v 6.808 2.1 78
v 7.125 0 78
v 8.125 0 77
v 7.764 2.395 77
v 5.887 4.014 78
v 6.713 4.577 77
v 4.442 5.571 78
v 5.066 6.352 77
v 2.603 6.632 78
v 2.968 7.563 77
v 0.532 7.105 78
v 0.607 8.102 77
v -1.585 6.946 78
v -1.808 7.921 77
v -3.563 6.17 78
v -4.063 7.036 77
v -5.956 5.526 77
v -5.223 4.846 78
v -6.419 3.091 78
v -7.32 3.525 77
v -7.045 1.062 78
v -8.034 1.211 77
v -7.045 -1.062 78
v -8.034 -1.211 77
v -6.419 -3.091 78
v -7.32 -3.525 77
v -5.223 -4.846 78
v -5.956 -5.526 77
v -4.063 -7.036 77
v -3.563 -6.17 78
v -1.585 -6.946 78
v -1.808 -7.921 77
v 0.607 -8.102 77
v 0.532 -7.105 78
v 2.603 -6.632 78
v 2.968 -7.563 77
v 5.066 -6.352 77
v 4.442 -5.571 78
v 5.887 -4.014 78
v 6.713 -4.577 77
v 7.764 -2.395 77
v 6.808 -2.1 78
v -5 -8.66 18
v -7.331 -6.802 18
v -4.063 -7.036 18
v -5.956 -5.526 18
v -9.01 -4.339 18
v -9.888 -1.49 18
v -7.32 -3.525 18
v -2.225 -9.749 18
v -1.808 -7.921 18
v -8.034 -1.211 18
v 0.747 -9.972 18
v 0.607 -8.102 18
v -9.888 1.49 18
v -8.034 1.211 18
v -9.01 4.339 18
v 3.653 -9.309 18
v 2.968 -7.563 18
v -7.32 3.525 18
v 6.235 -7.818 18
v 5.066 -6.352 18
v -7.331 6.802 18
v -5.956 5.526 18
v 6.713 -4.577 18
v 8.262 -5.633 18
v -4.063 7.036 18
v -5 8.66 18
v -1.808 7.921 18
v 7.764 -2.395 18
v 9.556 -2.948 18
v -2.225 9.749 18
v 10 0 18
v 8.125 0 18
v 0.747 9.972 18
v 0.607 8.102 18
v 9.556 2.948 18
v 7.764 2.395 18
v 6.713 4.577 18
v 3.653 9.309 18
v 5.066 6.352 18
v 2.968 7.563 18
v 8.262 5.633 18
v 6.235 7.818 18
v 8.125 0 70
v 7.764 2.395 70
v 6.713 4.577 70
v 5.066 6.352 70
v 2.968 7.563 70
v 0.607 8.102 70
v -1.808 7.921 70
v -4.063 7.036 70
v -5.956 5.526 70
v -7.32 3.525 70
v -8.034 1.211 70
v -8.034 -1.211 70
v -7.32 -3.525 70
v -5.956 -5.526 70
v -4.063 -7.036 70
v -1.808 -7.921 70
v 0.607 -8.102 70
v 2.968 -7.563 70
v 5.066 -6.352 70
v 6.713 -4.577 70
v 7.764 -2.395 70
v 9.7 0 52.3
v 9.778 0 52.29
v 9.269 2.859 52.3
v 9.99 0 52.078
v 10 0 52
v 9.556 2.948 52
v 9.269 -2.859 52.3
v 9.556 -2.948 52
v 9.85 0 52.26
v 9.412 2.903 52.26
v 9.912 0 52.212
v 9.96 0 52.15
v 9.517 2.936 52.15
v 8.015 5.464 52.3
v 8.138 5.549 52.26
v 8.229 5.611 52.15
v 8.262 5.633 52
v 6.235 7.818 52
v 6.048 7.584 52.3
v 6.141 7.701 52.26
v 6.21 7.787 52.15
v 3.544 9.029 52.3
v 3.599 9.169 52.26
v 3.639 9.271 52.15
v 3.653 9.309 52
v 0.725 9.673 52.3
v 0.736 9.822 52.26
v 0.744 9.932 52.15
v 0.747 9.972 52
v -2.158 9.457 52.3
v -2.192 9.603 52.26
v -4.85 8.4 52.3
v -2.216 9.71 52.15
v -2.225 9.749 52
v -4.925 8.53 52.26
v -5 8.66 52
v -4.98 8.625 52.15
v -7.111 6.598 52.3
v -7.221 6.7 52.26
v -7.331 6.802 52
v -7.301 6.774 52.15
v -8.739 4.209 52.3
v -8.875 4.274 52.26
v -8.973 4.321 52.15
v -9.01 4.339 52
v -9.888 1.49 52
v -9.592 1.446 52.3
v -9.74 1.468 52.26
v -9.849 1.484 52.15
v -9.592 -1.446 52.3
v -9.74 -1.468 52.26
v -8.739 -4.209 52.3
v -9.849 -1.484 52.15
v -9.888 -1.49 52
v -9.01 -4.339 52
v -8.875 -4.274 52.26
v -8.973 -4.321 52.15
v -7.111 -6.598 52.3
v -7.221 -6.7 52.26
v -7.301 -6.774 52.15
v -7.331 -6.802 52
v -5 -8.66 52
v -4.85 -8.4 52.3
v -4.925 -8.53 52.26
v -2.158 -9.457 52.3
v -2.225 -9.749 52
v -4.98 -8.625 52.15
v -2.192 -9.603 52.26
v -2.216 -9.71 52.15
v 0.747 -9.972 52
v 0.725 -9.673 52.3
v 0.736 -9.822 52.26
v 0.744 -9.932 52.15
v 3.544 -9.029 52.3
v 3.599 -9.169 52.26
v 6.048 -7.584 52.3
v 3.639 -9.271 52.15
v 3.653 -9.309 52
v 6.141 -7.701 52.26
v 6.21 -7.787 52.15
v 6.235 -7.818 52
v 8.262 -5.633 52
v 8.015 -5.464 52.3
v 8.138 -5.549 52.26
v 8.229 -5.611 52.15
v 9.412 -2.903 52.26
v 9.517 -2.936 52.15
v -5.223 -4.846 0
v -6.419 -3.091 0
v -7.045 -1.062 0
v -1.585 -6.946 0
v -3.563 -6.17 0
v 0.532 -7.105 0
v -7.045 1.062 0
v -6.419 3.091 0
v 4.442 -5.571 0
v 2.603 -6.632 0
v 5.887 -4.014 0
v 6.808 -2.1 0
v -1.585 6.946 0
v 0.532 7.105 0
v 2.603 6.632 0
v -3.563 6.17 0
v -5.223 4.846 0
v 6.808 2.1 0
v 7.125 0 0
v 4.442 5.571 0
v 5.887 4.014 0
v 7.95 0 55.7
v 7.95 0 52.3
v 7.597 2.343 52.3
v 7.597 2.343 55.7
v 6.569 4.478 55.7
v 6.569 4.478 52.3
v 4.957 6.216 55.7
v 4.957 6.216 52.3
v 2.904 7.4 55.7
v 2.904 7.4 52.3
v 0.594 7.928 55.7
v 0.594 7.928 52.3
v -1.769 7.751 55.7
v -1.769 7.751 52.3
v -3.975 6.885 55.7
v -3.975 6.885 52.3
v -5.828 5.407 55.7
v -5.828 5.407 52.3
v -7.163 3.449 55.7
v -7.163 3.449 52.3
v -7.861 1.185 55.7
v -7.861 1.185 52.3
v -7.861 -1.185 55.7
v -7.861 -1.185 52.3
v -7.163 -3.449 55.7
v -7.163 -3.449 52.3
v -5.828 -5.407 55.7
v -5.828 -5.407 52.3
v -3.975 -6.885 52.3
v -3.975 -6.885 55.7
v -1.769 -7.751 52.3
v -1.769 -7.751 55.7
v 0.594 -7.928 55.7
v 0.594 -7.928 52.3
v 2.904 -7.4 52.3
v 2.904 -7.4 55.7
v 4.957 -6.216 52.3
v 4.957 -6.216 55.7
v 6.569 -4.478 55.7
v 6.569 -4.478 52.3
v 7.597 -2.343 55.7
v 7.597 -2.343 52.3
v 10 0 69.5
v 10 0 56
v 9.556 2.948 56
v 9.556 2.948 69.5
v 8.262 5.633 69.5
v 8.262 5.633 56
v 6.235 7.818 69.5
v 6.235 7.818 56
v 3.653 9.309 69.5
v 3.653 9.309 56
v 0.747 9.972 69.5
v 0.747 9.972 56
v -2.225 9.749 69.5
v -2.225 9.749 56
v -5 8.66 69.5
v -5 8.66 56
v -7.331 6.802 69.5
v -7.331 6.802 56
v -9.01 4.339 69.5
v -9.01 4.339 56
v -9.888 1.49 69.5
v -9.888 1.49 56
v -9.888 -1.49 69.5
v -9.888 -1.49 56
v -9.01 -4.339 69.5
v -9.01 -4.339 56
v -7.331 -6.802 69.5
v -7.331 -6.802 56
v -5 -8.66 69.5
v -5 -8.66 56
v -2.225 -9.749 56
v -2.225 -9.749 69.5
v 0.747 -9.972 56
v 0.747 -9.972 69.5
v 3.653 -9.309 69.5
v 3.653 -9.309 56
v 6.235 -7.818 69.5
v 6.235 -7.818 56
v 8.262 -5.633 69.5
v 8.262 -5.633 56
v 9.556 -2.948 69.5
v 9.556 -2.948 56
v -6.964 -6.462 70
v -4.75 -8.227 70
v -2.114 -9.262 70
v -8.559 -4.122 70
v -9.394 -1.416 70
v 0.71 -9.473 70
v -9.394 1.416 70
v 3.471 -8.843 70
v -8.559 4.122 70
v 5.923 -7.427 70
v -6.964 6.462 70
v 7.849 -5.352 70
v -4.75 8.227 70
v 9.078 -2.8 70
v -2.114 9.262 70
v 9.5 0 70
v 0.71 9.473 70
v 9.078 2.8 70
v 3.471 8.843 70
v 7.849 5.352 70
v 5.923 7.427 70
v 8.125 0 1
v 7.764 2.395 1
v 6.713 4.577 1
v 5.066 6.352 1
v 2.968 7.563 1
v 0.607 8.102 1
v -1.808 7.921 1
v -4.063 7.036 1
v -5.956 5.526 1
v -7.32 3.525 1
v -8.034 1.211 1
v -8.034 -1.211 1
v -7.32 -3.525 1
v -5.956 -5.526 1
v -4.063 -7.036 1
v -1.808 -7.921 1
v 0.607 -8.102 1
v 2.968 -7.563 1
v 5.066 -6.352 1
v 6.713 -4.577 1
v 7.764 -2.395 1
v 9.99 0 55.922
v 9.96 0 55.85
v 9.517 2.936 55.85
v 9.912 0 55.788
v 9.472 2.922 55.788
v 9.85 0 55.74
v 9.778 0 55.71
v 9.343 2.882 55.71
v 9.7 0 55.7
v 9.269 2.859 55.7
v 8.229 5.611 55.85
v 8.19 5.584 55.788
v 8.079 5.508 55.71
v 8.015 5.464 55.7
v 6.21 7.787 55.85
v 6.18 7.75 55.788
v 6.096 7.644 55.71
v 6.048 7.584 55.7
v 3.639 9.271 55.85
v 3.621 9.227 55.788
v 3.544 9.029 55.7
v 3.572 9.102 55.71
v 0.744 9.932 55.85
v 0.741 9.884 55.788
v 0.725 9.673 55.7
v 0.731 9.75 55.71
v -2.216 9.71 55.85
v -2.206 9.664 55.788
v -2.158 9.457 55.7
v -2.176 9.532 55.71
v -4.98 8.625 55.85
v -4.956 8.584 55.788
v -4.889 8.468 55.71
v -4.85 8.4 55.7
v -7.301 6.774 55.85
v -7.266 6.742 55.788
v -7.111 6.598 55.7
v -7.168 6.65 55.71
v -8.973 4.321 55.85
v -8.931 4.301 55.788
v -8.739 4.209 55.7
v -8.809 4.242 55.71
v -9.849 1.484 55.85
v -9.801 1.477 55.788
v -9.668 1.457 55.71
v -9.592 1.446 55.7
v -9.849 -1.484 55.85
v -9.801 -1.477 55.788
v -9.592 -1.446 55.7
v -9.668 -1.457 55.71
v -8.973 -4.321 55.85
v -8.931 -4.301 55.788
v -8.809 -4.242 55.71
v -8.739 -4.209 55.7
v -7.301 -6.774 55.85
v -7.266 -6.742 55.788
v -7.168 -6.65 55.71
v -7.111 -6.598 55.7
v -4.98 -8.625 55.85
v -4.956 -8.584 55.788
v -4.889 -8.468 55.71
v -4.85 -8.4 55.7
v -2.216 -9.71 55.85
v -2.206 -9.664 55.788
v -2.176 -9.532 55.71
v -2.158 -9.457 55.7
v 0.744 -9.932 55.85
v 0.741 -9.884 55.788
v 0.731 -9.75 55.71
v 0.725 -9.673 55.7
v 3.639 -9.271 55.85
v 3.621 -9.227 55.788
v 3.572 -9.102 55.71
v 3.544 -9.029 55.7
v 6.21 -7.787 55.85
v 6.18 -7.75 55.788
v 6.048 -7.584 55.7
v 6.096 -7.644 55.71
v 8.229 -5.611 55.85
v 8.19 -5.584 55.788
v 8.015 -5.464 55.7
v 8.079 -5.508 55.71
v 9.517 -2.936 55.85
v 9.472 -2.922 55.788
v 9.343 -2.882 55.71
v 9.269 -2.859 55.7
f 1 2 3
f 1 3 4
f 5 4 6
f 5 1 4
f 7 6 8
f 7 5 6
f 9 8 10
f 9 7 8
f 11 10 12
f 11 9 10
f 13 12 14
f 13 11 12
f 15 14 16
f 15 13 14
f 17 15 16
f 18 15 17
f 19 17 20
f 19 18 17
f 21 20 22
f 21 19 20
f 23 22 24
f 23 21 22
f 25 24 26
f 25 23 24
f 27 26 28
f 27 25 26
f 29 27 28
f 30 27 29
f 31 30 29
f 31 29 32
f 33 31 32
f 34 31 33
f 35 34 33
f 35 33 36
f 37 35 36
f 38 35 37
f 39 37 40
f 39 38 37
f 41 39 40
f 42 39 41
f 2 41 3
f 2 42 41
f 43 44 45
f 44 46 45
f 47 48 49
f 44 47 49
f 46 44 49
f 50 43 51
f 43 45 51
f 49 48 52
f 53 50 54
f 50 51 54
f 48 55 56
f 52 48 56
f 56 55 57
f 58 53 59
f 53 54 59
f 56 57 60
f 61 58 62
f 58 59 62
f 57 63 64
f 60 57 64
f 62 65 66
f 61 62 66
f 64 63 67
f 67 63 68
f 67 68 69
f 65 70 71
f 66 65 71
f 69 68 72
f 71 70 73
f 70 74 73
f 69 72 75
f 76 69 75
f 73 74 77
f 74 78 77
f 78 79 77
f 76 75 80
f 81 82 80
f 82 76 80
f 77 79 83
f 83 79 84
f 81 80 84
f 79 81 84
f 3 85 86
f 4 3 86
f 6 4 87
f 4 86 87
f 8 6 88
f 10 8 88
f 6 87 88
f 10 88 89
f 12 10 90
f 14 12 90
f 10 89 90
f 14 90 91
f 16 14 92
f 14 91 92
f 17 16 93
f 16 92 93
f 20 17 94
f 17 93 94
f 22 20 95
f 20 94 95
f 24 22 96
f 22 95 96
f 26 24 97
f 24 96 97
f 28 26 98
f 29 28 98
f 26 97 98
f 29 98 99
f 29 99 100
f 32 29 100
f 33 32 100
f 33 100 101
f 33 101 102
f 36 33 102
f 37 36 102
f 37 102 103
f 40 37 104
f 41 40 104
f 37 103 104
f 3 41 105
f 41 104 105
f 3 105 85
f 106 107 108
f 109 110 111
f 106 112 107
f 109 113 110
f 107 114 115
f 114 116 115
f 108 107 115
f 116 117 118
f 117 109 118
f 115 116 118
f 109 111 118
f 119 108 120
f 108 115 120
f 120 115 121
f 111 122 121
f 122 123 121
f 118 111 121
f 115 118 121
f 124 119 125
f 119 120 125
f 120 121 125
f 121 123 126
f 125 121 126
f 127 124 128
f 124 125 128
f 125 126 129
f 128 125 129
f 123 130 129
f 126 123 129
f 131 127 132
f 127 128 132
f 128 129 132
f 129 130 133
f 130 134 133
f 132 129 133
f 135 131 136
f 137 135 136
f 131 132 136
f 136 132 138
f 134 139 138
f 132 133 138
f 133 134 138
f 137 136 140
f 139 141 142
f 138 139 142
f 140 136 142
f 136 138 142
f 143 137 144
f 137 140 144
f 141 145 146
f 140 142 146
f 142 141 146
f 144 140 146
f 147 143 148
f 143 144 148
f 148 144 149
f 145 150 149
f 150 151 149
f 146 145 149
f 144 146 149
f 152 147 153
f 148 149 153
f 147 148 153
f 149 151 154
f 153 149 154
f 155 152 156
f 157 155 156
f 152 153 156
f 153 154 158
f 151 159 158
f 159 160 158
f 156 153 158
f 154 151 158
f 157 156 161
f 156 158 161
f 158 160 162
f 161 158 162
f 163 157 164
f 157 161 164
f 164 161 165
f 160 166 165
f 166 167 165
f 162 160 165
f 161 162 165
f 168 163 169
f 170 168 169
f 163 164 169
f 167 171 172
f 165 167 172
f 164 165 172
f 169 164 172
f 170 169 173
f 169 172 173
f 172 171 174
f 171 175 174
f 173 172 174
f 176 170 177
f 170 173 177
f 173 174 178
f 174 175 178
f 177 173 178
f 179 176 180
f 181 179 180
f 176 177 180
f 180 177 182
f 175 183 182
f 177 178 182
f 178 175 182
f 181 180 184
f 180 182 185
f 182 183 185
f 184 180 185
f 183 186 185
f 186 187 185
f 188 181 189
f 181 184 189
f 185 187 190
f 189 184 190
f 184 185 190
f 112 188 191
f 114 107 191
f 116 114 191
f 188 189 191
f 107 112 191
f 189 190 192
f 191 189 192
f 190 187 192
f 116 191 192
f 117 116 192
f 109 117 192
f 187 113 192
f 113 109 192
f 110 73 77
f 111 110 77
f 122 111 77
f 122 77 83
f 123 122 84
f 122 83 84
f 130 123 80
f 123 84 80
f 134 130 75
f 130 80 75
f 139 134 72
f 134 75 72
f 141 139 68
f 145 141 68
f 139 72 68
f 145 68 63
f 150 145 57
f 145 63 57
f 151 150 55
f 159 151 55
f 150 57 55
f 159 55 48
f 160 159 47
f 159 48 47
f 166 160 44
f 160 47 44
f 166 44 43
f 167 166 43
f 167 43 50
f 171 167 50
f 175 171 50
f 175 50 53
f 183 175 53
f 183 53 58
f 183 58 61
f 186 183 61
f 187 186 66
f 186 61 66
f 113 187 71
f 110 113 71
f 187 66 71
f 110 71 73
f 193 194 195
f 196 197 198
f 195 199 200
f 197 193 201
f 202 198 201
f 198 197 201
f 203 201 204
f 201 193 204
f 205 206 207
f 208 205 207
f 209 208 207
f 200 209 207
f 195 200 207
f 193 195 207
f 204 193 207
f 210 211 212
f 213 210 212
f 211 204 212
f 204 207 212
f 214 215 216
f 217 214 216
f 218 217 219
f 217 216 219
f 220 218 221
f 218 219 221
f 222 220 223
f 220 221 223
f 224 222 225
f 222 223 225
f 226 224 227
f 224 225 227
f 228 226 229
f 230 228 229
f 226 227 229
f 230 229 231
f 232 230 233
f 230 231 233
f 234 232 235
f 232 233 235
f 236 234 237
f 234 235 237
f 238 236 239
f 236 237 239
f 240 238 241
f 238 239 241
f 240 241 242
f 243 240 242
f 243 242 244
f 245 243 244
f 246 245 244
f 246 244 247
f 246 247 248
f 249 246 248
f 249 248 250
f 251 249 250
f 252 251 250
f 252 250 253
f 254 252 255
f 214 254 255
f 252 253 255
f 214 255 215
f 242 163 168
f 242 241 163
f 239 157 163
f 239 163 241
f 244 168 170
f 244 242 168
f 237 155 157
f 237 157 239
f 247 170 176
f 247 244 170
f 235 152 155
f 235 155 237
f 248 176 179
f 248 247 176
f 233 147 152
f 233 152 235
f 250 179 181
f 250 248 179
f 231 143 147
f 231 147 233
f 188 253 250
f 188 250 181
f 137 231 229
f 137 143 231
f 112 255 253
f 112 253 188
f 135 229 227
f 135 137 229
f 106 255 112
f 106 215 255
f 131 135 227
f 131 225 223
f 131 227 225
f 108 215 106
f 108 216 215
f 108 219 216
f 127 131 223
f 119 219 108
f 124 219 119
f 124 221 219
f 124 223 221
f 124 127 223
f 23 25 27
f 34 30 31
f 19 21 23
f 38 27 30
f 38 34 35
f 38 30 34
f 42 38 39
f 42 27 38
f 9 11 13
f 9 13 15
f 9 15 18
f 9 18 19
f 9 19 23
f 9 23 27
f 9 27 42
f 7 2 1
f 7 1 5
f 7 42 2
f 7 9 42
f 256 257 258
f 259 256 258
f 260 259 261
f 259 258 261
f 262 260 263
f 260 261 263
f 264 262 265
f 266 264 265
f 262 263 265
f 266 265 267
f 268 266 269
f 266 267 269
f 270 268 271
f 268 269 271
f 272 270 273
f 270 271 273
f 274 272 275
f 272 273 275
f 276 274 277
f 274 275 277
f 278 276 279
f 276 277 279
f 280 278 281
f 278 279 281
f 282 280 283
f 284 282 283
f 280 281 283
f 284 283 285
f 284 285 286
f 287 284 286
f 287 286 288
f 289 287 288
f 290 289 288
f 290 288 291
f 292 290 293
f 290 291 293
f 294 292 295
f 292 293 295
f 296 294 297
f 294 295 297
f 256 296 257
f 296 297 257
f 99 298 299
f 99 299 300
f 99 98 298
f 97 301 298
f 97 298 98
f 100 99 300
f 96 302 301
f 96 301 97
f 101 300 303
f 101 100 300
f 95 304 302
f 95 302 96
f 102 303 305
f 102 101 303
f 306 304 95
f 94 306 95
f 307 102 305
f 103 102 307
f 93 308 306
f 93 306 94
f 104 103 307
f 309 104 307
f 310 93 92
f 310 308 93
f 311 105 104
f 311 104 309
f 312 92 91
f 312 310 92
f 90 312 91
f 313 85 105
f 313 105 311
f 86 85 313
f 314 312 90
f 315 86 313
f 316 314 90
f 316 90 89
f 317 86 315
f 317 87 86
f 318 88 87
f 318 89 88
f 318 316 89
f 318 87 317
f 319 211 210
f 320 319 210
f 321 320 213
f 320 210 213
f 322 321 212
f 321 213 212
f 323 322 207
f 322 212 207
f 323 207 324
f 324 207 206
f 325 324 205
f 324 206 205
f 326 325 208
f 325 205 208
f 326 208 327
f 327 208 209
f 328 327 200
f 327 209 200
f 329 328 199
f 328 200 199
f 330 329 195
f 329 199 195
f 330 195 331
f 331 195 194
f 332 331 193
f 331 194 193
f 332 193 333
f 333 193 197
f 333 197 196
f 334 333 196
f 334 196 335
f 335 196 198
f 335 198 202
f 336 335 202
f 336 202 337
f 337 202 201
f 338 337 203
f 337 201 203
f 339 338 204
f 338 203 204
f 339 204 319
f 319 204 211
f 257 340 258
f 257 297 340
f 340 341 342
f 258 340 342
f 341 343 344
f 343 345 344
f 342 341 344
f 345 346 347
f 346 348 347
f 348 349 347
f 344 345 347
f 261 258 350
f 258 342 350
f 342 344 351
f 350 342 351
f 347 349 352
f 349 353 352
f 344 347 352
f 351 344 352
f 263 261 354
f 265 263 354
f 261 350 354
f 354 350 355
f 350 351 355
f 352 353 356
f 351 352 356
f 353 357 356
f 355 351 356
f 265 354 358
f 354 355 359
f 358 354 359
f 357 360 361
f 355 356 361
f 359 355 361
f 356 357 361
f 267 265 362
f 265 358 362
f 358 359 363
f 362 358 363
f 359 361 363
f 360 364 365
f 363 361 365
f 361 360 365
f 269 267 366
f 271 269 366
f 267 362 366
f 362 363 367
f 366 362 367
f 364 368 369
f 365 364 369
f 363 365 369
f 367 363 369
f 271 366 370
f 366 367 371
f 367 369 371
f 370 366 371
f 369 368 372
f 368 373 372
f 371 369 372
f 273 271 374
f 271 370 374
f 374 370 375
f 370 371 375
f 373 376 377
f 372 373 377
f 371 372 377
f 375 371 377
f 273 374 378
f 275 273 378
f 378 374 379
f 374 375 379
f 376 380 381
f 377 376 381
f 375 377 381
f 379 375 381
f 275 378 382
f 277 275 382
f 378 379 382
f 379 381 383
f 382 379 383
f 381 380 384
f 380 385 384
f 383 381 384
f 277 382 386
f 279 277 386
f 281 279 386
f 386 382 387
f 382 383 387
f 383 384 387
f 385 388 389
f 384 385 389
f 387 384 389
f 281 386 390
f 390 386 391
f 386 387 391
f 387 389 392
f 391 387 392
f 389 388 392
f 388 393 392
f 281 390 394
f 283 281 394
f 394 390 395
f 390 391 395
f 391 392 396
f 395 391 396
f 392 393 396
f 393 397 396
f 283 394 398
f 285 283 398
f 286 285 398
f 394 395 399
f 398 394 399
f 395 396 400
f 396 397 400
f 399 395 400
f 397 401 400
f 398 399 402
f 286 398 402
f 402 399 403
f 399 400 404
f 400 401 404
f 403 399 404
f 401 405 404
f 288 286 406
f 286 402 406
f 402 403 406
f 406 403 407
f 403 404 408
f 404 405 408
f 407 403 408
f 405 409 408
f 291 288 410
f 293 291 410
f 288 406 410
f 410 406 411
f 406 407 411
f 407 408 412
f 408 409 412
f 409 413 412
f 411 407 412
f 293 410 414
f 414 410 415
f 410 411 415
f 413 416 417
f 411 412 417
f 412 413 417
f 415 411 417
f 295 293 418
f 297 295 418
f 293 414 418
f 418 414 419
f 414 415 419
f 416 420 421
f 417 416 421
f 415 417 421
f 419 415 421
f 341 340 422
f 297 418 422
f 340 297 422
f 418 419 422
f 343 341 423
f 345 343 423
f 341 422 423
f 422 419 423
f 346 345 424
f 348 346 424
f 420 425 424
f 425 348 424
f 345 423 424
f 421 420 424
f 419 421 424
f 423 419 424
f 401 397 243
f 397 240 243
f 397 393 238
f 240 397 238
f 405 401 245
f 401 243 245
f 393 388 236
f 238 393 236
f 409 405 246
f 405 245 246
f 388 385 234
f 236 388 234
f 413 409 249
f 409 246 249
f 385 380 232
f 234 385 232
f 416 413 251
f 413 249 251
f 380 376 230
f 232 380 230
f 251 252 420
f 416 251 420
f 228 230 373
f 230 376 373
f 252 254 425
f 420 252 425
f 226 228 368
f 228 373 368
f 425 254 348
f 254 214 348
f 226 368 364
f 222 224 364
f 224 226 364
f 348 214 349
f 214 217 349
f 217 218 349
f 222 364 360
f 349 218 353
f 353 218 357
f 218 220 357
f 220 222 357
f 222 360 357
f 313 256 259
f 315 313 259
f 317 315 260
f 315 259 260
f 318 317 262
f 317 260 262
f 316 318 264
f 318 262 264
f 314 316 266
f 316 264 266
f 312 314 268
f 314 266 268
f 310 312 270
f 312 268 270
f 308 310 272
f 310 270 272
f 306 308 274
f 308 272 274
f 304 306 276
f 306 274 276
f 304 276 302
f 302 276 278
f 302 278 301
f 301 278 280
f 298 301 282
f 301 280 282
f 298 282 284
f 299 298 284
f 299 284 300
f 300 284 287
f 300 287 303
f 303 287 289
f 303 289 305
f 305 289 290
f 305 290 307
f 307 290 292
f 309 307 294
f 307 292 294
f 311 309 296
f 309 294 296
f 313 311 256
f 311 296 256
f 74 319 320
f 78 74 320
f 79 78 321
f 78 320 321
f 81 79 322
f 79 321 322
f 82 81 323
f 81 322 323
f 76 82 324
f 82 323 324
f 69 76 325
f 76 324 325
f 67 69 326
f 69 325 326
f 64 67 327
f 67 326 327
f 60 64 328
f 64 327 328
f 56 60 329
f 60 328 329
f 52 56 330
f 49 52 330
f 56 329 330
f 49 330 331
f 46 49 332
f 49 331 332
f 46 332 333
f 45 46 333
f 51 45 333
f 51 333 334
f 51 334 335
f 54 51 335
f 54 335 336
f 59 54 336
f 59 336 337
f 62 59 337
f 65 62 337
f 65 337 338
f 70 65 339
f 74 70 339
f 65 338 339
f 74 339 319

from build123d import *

# Parameters (mm, degrees)
F0_R      = 8.125
F1_DEPTH  = 18
F2_SIZE   = 1
F3_R      = 10
F4_DEPTH  = 34.3
F5_R      = 7.95
F6_DEPTH  = 3.4
F8_R      = 10
F9_DEPTH  = 14.3
F10_R     = 8.125
F11_DEPTH = 8
F12_SIZE  = 1
F13_SIZE  = 0.5
F14_R     = 0.3


with BuildPart() as f1:
    # F0 (on Top) → F1 (new body)
    with BuildSketch(Plane.XY):
        Circle(F0_R)
    extrude(amount=F1_DEPTH)

    # F2
    f2_edges = [f1.edges().sort_by_distance(p)[0] for p in [
        (-8.125, 0, 0),
    ]]
    chamfer(f2_edges, length=F2_SIZE)

    # F3 (on face) → F4 (join)
    with BuildSketch(Plane.XY.offset(18)):
        Circle(F3_R)
    extrude(amount=F4_DEPTH)

    # F5 (on face) → F6 (join)
    with BuildSketch(Plane.XY.offset(52.3)):
        Circle(F5_R)
    extrude(amount=F6_DEPTH)

    # F8 (on face) → F9 (join)
    with BuildSketch(Plane.XY.offset(55.7)):
        Circle(F8_R)
    extrude(amount=F9_DEPTH)

    # F10 (on face) → F11 (join)
    with BuildSketch(Plane.XY.offset(70)):
        Circle(F10_R)
    extrude(amount=F11_DEPTH)

    # F12
    f12_edges = [f1.edges().sort_by_distance(p)[0] for p in [
        (-8.125, 0, 78),
    ]]
    chamfer(f12_edges, length=F12_SIZE)

    # F13
    f13_edges = [f1.edges().sort_by_distance(p)[0] for p in [
        (-10, 0, 70),
    ]]
    chamfer(f13_edges, length=F13_SIZE)

    # F14
    f14_edges = [f1.edges().sort_by_distance(p)[0] for p in [
        (-10, 0, 55.7),
        (-10, 0, 52.3),
    ]]
    fillet(f14_edges, radius=F14_R)


solid = f1.part
